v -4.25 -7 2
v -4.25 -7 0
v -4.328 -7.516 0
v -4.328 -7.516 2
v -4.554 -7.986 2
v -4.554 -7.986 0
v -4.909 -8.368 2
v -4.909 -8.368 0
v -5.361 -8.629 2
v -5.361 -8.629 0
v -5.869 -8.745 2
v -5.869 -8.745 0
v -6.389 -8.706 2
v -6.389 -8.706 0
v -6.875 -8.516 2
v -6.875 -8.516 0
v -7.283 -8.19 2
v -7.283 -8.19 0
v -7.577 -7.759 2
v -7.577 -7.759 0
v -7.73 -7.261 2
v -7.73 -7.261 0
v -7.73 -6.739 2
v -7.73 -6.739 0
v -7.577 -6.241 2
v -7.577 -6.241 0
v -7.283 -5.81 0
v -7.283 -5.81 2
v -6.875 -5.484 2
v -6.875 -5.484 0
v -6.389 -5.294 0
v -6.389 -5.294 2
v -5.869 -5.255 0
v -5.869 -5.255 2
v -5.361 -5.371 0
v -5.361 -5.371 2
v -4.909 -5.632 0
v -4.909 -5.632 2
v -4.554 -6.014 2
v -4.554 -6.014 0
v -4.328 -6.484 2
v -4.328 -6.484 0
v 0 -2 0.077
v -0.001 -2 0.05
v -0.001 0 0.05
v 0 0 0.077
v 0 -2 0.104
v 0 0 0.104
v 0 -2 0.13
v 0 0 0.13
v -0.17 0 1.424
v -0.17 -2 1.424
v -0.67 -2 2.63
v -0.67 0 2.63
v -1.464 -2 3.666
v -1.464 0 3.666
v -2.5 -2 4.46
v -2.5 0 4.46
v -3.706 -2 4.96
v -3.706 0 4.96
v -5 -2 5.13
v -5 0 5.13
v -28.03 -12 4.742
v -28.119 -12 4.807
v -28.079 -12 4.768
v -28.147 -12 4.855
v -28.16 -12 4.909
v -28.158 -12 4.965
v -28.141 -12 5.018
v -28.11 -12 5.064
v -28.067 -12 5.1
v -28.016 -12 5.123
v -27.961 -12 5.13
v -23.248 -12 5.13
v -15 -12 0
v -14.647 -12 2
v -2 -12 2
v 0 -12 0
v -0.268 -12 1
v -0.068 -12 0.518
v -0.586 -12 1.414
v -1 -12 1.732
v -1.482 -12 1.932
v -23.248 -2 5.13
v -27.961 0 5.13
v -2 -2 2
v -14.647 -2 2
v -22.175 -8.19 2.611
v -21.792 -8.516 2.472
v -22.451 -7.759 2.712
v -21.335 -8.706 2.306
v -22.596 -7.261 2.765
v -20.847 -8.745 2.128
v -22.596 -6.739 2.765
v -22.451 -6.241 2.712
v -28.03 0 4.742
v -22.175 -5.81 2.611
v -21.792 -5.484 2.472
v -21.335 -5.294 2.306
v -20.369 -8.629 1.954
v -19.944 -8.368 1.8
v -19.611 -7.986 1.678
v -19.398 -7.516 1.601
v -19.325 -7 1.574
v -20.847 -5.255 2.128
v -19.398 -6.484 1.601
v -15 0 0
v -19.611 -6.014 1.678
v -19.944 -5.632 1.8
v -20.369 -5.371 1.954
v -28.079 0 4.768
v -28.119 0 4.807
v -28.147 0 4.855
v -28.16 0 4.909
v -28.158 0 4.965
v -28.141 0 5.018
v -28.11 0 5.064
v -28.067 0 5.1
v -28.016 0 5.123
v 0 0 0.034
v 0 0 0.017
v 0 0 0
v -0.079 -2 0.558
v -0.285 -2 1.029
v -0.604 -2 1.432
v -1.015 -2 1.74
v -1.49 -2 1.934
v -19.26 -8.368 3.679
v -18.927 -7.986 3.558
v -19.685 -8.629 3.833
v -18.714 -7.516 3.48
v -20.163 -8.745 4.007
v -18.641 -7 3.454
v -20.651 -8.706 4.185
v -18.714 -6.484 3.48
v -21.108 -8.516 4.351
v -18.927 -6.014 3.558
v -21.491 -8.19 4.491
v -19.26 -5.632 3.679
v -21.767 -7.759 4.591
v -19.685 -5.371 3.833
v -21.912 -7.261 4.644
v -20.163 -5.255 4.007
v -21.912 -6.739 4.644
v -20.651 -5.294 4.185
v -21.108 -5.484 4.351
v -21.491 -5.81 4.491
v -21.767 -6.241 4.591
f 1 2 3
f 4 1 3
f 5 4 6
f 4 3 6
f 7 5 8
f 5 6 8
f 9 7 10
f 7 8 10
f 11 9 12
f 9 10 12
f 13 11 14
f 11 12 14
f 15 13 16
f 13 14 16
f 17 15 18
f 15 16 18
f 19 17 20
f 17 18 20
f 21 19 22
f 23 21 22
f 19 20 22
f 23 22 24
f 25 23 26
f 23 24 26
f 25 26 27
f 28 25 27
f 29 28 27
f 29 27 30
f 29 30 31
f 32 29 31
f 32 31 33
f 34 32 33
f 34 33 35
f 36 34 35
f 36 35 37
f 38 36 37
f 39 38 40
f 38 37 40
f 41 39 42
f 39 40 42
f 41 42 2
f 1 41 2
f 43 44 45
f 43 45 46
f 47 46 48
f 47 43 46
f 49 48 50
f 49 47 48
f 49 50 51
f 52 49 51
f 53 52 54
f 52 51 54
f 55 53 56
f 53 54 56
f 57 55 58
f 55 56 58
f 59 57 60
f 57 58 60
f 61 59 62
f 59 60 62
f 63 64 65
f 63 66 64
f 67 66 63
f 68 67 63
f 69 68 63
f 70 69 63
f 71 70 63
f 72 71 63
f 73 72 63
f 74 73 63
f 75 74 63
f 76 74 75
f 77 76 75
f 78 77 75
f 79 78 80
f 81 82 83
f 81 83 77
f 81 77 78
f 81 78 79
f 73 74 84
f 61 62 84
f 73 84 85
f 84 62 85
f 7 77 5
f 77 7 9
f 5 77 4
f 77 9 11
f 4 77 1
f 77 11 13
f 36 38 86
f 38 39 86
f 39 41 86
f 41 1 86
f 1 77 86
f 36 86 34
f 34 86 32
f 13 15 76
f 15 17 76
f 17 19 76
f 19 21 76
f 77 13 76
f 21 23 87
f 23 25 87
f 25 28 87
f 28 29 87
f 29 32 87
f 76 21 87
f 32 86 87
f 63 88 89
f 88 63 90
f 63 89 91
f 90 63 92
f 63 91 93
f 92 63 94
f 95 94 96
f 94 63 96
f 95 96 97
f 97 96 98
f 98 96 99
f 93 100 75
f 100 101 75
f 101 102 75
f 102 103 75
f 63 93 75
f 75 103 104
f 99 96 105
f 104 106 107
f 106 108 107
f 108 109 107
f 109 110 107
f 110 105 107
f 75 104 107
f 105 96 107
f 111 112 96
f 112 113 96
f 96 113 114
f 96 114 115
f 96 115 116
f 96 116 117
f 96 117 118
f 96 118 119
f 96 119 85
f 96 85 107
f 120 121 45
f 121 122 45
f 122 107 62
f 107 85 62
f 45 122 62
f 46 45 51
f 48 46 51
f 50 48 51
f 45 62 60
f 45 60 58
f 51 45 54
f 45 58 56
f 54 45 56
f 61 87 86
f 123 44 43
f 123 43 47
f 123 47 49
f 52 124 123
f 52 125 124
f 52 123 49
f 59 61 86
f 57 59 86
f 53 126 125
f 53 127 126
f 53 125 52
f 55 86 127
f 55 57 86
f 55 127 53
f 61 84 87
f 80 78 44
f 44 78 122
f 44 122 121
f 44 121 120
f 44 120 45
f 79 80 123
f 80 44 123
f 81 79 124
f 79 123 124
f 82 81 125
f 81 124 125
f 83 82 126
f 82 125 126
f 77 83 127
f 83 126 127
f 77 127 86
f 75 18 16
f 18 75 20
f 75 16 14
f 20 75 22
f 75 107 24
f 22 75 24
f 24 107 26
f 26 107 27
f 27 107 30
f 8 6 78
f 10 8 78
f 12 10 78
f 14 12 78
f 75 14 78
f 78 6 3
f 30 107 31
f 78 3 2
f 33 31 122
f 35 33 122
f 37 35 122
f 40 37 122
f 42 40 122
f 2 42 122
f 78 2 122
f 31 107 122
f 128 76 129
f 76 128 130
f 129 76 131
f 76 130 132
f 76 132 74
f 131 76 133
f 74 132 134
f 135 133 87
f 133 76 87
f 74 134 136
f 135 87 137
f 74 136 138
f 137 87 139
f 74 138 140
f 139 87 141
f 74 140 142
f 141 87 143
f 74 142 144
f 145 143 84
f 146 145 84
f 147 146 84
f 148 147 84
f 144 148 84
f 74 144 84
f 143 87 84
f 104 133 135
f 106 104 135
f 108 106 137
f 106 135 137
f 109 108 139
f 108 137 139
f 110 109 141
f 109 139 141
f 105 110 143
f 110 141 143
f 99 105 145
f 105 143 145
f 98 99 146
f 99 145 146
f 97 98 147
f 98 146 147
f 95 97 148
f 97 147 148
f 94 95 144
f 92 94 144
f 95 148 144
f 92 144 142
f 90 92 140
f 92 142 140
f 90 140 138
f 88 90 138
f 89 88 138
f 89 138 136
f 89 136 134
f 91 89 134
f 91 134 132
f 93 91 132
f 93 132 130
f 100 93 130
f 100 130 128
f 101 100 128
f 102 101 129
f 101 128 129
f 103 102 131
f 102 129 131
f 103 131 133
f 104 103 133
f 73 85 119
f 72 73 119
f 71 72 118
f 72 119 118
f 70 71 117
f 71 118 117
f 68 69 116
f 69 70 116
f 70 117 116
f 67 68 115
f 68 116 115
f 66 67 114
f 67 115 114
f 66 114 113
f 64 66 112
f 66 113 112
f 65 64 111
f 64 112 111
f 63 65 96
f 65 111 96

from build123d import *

# Parameters (mm, degrees)
F1_DEPTH    = 2
F3_DEPTH    = 10
F4_T1_DEPTH = 17.6712818196
F5_R        = 1.75
F6_DEPTH    = 2
F7_R        = 1.75
F8_DEPTH    = 2
F9_T1_DEPTH = 15
F9_T6_DEPTH = 20
F9_S7_R     = 5
F9_T8_DEPTH = 12


# Not quite as in the source:
# - a fillet or chamfer that OpenCascade refuses, or shapes differently, is made with other operations: its cross-section is extruded or revolved along the edge and cut away or added


with BuildPart() as f1:
    # F0 (on Front) → F1 (new body)
    with BuildSketch(Plane.XZ):
        with BuildLine():
            Line((-15, 0), (0, 0))
            Line((0, 0), (0, 0.1303021499))
            ThreePointArc((0, 0.1303021499), (-1.4644660941, 3.6658360558), (-5, 5.1303021499))
            Line((-5, 5.1303021499), (-29.0953893118, 5.1303021499))
            Line((-29.0953893118, 5.1303021499), (-15, 0))
        make_face()
    extrude(amount=F1_DEPTH)

    # F2 (on face) → F3 (join)
    with BuildSketch(Plane.XZ.offset(2)):
        Polygon((-23.2477805115, 5.1303021499), (-29.0953893118, 5.1303021499), (-15, 0), (0, 0), (0, 2), (-14.6473460386, 2), align=None)
    extrude(amount=F3_DEPTH)

    # F4: fillet of radius 0.2 on 1 edges, made by hand

    # F4_s2 → F4_t1 (cut)
    with BuildSketch(Plane.XZ.offset(-2.8356409098)):
        with BuildLine():
            ThreePointArc((-27.9611329479, 5.1303021499), (-28.1580944985, 4.9650317854), (-28.0295369765, 4.7423636257))
            Line((-28.0295369765, 4.7423636257), (-29.0953893118, 5.1303021499))
            Line((-29.0953893118, 5.1303021499), (-27.9611329479, 5.1303021499))
        make_face()
    extrude(amount=F4_T1_DEPTH, mode=Mode.SUBTRACT)

    # F5 (on face) → F6 (cut, through all)
    with BuildSketch(Plane(origin=(-1.07062639, 0, -2.9415218311), x_dir=(0.9396926208, 0, -0.3420201433), z_dir=(0.3420201433, 0, 0.9396926208))):
        with Locations((-20.4480432732, -7)):
            Circle(F5_R)
    extrude(amount=-F6_DEPTH, mode=Mode.SUBTRACT)

    # F7 (on face) → F8 (cut, through all)
    with BuildSketch(Plane(origin=(0, 0, 0), x_dir=(1, 0, 0), z_dir=(0, 0, -1))):
        with Locations((-6, 7)):
            Circle(F7_R)
    extrude(amount=-F8_DEPTH, mode=Mode.SUBTRACT)

    # F9: fillet of radius 2 on 1 edges, made by hand

    # F9_s2 → F9_t1 (cut)
    with BuildSketch(Plane.XZ.offset(2)):
        with BuildLine():
            ThreePointArc((0, 0), (-0.5857864376, 1.4142135624), (-2, 2))
            Line((-2, 2), (0, 2))
            Line((0, 2), (0, 0))
        make_face()
    extrude(amount=F9_T1_DEPTH, mode=Mode.SUBTRACT)


with BuildPart() as f9_tool4:
    # F9_s5 → F9_t6 (new body)
    with BuildSketch(Plane.XZ.offset(-3)):
        with BuildLine():
            ThreePointArc((0, 0), (-0.5857864376, 1.4142135624), (-2, 2))
            Line((-2, 2), (0, 2))
            Line((0, 2), (0, 0))
        make_face()
    extrude(amount=F9_T6_DEPTH)

    # F9_s7 → F9_t8 (cut, symmetric)
    with BuildSketch(Plane.XZ.offset(7)):
        with Locations((-5, 0.1303021499)):
            Circle(F9_S7_R)
    extrude(amount=F9_T8_DEPTH, both=True, mode=Mode.SUBTRACT)


with BuildPart() as f1_1:
    add(f1.part)

    # F9_t3: cut F9_tool4
    add(f9_tool4.part, mode=Mode.SUBTRACT)


solid = f1_1.part
